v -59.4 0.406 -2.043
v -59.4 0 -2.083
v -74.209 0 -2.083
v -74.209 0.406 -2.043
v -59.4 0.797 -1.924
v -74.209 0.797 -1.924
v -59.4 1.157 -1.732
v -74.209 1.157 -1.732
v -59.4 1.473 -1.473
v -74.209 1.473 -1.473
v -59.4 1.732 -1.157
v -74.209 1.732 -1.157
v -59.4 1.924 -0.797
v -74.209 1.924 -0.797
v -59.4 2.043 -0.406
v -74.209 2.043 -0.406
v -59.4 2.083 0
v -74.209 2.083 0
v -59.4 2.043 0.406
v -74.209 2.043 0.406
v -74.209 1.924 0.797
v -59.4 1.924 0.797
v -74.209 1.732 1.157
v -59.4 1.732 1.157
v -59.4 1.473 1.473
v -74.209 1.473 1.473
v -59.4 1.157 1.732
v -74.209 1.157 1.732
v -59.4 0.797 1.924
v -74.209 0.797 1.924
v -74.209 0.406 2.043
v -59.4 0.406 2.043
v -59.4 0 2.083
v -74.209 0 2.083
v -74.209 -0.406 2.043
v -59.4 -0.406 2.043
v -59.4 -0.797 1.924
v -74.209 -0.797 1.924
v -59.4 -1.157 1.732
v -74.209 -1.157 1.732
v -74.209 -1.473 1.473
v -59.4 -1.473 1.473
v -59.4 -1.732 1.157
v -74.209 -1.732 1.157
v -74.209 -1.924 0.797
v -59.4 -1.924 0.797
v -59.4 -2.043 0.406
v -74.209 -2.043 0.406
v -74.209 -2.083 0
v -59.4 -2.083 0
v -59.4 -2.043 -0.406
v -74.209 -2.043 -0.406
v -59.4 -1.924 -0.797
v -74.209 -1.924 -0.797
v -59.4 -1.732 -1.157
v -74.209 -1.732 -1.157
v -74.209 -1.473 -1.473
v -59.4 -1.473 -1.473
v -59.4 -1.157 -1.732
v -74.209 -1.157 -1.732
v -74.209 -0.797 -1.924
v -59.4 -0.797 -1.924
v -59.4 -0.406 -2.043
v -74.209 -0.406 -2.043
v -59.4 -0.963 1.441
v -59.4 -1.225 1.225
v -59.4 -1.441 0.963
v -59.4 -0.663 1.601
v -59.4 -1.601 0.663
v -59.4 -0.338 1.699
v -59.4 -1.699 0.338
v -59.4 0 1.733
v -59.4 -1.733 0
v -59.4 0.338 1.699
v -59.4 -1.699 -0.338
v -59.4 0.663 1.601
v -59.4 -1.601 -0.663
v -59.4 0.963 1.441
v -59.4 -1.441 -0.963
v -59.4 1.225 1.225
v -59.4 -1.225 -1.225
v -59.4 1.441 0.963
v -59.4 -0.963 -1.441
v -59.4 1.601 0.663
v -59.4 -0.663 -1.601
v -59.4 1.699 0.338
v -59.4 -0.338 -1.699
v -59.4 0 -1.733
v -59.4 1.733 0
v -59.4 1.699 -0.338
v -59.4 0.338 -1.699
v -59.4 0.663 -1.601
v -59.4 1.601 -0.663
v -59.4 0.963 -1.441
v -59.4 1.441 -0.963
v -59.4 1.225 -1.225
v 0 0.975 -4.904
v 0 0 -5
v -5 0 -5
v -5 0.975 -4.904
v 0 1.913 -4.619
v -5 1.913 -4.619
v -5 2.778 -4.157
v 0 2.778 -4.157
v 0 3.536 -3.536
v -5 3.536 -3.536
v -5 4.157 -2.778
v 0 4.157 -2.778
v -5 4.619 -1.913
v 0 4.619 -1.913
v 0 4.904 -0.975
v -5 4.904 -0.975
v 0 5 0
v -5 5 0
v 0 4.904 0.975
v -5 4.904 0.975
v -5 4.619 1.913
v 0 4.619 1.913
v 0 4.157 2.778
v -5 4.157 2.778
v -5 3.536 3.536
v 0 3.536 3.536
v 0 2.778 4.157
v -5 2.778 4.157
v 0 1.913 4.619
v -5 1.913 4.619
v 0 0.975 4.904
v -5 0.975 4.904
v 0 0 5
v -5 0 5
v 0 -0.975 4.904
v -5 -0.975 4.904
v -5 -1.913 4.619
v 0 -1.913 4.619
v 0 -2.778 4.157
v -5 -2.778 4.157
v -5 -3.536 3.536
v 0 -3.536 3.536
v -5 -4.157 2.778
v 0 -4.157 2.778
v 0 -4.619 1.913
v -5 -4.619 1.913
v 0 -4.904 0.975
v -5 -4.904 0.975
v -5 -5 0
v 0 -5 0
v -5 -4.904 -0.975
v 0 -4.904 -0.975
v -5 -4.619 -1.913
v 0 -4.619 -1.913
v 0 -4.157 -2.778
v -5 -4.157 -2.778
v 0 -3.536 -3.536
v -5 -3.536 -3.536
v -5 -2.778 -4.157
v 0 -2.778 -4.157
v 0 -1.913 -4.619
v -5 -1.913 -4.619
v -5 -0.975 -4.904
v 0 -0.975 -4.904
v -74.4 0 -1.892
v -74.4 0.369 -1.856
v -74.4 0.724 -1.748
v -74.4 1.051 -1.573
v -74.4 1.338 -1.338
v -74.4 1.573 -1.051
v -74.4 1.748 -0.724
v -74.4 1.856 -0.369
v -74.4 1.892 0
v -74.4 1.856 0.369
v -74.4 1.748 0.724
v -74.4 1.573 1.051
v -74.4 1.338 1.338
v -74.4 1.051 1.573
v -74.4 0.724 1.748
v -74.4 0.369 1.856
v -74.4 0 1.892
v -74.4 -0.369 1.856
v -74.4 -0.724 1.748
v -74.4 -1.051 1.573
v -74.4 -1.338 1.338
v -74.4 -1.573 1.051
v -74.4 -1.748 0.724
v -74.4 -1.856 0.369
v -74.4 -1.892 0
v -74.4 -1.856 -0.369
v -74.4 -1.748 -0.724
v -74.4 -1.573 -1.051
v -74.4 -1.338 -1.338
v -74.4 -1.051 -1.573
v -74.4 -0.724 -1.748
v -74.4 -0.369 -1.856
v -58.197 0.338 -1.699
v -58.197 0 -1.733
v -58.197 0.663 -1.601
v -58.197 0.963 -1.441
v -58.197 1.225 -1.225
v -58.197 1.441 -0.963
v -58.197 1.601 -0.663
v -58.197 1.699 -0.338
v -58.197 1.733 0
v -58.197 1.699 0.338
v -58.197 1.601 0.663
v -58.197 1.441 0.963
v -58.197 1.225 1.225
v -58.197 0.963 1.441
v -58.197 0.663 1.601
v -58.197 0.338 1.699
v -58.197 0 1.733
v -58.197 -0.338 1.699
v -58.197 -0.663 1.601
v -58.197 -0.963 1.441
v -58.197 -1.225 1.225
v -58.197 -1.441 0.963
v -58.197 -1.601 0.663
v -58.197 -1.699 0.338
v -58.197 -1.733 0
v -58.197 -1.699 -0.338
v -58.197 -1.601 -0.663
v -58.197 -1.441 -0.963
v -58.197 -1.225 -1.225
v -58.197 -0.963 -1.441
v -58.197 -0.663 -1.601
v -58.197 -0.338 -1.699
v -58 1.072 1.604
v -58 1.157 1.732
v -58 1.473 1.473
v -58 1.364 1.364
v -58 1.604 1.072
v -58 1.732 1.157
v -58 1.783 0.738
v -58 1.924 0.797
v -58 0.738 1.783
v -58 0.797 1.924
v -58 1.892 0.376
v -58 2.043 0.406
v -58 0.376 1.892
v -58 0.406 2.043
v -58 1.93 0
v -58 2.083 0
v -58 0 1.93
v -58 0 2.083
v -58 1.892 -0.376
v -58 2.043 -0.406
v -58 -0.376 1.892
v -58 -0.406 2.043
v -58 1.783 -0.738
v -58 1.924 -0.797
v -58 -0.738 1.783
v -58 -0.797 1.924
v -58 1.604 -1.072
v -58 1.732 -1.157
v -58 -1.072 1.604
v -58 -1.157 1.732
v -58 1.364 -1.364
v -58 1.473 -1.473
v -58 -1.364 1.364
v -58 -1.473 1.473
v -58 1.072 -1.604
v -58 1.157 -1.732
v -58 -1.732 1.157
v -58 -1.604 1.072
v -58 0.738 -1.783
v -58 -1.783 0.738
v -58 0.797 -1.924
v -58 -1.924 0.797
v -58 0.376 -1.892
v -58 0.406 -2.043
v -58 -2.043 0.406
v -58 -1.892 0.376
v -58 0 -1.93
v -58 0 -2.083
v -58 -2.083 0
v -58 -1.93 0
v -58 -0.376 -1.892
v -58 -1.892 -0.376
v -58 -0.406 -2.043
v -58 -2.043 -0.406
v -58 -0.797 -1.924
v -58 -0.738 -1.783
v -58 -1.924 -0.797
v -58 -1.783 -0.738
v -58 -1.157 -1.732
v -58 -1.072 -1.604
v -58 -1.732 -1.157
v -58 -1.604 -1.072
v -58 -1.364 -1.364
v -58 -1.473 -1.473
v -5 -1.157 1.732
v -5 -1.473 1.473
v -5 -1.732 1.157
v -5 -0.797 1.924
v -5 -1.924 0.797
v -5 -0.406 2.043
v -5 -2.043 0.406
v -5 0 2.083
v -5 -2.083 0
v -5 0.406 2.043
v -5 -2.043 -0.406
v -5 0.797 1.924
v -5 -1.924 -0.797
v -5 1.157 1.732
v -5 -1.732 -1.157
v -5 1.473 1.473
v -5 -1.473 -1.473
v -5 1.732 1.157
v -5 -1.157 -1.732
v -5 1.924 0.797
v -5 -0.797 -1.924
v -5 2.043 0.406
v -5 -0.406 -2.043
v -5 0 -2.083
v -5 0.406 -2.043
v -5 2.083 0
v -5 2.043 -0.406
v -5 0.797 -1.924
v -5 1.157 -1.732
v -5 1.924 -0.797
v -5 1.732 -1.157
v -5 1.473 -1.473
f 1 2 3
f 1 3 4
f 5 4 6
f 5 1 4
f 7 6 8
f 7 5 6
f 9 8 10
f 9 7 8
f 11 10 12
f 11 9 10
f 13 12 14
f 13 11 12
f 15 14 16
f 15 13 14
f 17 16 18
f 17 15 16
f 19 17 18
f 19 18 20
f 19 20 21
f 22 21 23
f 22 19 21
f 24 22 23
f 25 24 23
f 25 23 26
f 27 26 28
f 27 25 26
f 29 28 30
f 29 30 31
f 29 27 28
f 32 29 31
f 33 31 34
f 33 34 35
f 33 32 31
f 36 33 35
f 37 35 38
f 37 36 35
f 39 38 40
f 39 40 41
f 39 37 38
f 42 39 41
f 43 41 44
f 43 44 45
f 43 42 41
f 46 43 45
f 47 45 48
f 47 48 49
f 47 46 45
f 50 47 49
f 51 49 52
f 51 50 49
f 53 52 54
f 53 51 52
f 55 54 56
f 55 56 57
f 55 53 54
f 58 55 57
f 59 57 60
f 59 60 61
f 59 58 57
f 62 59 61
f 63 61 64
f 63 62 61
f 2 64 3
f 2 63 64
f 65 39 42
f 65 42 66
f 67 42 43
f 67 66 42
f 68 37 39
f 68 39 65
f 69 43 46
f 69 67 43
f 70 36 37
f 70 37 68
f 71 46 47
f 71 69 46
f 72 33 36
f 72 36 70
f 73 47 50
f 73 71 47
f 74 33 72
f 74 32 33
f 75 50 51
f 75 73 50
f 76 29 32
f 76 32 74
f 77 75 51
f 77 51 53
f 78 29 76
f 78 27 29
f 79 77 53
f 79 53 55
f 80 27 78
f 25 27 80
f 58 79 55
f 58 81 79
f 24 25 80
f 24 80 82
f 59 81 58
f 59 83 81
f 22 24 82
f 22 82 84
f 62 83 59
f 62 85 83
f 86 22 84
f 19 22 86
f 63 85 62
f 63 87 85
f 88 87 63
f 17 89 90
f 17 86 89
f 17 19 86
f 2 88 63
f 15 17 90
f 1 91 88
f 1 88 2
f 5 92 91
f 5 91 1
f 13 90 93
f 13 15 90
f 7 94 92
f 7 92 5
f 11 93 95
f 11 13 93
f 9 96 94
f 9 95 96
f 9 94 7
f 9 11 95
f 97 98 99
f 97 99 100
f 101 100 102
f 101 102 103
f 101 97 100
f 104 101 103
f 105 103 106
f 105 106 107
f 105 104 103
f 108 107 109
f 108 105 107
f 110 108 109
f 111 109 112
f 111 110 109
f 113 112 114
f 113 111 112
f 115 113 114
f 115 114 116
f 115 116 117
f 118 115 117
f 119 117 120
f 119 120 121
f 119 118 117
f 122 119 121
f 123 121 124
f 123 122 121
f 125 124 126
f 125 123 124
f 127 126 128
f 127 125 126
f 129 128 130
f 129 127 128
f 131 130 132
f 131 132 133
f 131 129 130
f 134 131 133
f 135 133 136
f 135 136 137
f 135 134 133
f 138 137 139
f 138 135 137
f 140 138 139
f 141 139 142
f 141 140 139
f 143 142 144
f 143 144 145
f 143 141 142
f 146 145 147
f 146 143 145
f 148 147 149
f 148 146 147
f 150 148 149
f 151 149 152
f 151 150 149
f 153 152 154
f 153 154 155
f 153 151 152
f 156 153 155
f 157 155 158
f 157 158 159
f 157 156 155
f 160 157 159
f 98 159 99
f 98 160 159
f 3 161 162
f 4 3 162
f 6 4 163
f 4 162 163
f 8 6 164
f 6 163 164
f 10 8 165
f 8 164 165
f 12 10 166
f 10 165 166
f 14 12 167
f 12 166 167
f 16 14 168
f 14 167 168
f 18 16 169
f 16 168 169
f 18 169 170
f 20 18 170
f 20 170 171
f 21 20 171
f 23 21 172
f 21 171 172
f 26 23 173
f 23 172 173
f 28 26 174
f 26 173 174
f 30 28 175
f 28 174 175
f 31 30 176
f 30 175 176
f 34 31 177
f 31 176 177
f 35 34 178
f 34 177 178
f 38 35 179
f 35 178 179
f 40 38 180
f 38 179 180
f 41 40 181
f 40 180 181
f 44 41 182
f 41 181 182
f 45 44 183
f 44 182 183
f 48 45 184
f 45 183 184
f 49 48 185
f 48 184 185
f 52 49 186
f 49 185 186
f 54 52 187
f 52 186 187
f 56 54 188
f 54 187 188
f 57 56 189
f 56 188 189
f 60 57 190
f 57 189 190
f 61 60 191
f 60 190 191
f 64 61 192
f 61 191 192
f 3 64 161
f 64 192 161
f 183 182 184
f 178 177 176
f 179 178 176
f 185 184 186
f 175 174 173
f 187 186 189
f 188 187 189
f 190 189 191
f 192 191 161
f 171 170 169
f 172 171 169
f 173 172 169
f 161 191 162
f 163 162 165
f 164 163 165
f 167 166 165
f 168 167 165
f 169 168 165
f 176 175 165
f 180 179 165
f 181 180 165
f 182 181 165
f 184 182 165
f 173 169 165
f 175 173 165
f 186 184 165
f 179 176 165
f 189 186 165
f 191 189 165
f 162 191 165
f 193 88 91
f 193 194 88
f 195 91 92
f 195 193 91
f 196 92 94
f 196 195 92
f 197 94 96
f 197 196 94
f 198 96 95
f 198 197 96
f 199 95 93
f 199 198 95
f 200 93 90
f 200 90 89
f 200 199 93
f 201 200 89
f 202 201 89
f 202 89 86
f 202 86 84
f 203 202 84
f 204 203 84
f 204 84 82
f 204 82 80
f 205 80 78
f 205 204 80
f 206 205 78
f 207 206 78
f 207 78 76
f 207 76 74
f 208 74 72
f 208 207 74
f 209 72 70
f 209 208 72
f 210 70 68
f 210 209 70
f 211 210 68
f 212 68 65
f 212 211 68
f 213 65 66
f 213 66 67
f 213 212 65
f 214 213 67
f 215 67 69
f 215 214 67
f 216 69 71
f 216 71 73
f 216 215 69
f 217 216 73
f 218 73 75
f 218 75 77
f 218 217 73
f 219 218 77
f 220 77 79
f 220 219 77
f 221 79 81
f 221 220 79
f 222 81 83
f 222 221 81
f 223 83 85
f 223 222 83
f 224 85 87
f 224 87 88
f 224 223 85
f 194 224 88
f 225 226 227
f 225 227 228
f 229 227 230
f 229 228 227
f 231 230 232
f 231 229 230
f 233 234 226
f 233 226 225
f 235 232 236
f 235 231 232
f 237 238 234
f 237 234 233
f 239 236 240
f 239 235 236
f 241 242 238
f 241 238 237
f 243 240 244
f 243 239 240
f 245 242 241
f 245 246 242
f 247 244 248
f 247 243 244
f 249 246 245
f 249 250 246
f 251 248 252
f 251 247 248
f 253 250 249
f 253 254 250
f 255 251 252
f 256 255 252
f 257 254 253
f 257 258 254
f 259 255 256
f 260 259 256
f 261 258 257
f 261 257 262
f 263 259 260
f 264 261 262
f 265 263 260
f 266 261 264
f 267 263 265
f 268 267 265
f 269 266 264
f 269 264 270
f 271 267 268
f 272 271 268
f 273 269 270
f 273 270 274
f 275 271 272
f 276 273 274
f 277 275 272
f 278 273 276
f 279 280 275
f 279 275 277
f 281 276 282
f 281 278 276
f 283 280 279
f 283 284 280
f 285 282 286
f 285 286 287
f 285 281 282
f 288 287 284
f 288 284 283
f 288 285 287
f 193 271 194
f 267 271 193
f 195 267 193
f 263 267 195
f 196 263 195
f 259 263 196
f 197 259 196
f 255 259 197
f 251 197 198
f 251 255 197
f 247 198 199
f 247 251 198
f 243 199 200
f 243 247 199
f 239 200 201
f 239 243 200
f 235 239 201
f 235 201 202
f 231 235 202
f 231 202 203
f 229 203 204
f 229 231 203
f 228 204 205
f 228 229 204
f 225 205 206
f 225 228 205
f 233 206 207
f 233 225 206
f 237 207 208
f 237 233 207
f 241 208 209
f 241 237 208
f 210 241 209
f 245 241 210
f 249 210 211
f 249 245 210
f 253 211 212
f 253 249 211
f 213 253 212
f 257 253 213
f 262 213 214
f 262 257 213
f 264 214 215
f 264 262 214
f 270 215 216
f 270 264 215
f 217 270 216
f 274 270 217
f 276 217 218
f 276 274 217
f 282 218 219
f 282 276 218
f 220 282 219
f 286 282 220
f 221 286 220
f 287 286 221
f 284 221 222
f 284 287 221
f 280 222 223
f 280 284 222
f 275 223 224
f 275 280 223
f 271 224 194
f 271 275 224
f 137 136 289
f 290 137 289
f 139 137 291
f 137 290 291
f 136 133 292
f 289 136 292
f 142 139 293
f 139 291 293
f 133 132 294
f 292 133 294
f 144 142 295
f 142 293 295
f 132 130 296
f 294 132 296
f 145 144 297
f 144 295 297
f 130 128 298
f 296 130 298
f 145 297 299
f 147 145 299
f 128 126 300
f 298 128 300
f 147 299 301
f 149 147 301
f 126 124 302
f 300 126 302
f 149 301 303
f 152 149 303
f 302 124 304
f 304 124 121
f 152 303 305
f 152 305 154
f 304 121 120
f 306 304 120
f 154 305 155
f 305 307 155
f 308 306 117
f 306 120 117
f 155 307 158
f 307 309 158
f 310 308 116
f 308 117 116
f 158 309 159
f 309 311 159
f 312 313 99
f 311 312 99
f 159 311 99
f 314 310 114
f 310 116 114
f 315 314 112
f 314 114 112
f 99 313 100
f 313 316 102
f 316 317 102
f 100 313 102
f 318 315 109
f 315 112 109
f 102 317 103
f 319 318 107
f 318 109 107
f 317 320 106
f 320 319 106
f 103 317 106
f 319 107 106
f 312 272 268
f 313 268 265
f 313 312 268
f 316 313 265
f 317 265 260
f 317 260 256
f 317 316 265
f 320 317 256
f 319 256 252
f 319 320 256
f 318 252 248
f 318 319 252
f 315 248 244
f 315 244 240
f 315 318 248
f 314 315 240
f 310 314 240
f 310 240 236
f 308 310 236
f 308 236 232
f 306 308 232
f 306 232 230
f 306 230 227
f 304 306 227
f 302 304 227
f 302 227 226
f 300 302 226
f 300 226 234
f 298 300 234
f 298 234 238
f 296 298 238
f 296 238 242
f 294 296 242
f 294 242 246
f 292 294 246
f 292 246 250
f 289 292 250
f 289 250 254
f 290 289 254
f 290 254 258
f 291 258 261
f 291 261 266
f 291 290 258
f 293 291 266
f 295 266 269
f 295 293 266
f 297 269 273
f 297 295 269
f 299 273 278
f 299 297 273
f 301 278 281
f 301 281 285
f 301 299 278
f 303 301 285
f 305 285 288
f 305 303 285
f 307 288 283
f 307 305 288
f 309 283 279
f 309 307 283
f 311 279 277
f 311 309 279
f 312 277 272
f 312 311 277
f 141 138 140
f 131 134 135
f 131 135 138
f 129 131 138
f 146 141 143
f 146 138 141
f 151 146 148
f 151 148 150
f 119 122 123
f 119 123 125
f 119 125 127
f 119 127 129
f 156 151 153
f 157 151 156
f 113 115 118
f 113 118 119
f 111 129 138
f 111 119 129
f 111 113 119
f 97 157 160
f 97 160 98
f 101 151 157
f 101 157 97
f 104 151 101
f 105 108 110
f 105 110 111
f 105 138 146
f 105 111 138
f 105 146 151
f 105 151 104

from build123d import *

# Parameters (mm, degrees)
SKETCH1_R           = 4.99999
SKETCH1_R_2         = 2.182749
SKETCH1_R_3         = 2.0828
SKETCH1_R_4         = 1.932813
SKETCH1_R_5         = 1.732788
BOSS_EXTRUDE2_DEPTH = 4.99999
SKETCH1_5_R         = 2.0828
BOSS_EXTRUDE3_DEPTH = 57.999884
BOSS_EXTRUDE4_START = -57.999884
SKETCH1_6_R         = 1.932813
BOSS_EXTRUDE4_DEPTH = 0.199898
BOSS_EXTRUDE5_START = -58.199782
SKETCH1_7_R         = 1.732788
BOSS_EXTRUDE5_DEPTH = 1.199896
BOSS_EXTRUDE6_START = -59.399678
SKETCH1_8_R         = 2.0828
BOSS_EXTRUDE6_DEPTH = 14.99997
CHAMFER1_SIZE       = 0.2032
CHAMFER2_SIZE       = 0.1905


with BuildPart() as part:
    # Sketch1 → Boss-Extrude2 (new body)
    # profile 1 of 5: a face of its own
    with BuildSketch(Plane(origin=(0, 0, 0), x_dir=(0, 0, -1), z_dir=(1, 0, 0))):
        Circle(SKETCH1_R)
        Circle(SKETCH1_R_2, mode=Mode.SUBTRACT)
    # profile 2 of 5: a face of its own
    with BuildSketch(Plane(origin=(0, 0, 0), x_dir=(0, 0, -1), z_dir=(1, 0, 0))):
        Circle(SKETCH1_R_2)
        Circle(SKETCH1_R_3, mode=Mode.SUBTRACT)
    # profile 3 of 5: a face of its own
    with BuildSketch(Plane(origin=(0, 0, 0), x_dir=(0, 0, -1), z_dir=(1, 0, 0))):
        Circle(SKETCH1_R_3)
        Circle(SKETCH1_R_4, mode=Mode.SUBTRACT)
    # profile 4 of 5: a face of its own
    with BuildSketch(Plane(origin=(0, 0, 0), x_dir=(0, 0, -1), z_dir=(1, 0, 0))):
        Circle(SKETCH1_R_4)
        Circle(SKETCH1_R_5, mode=Mode.SUBTRACT)
    # profile 5 of 5: a face of its own
    with BuildSketch(Plane(origin=(0, 0, 0), x_dir=(0, 0, -1), z_dir=(1, 0, 0))):
        Circle(SKETCH1_R_5)
    extrude(amount=-BOSS_EXTRUDE2_DEPTH)

    # Sketch1<5> → Boss-Extrude3 (add)
    with BuildSketch(Plane(origin=(0, 0, 0), x_dir=(0, 0, -1), z_dir=(1, 0, 0))):
        Circle(SKETCH1_5_R)
    extrude(amount=-BOSS_EXTRUDE3_DEPTH)

    # Sketch1<6> → Boss-Extrude4 (add)
    with BuildSketch(Plane(origin=(0, 0, 0), x_dir=(0, 0, -1), z_dir=(1, 0, 0)).offset(BOSS_EXTRUDE4_START)):
        Circle(SKETCH1_6_R)
    extrude(amount=-BOSS_EXTRUDE4_DEPTH)

    # Sketch1<7> → Boss-Extrude5 (add)
    with BuildSketch(Plane(origin=(0, 0, 0), x_dir=(0, 0, -1), z_dir=(1, 0, 0)).offset(BOSS_EXTRUDE5_START)):
        Circle(SKETCH1_7_R)
    extrude(amount=-BOSS_EXTRUDE5_DEPTH)

    # Sketch1<8> → Boss-Extrude6 (add)
    with BuildSketch(Plane(origin=(0, 0, 0), x_dir=(0, 0, -1), z_dir=(1, 0, 0)).offset(BOSS_EXTRUDE6_START)):
        Circle(SKETCH1_8_R)
    extrude(amount=-BOSS_EXTRUDE6_DEPTH)

    # Chamfer1
    # the kernel refuses this chamfer: 0.2032 mm, written as the material it takes off along each edge
    with BuildSketch(Plane(origin=(-58.199782, 0, 0), x_dir=(0, 0, -1), z_dir=(0, -1, 0))) as chamfer1_piece_1_section:
        Polygon((1.932813 - CHAMFER1_SIZE, 0), (1.932813, CHAMFER1_SIZE), (1.932813, 0), align=None)
    chamfer1_piece_1 = revolve(axis=Axis((-58.199782, 0, 0), (1, 0, 0)), mode=Mode.PRIVATE)
    chamfer1_piece_1 = chamfer1_piece_1 - Plane(origin=(-58.102785298, 0, 0), x_dir=(0, 0, -1), z_dir=(1, 0, 0)) * Cylinder(1.732788, 8, mode=Mode.PRIVATE)
    chamfer1_piece_1 = split(chamfer1_piece_1, bisect_by=Plane(origin=(-57.999884, 0, 1.835689298), z_dir=(-1, 0, 0)), keep=Keep.TOP, mode=Mode.PRIVATE)
    add(chamfer1_piece_1, mode=Mode.SUBTRACT)

    # Chamfer2
    chamfer2_edges = [part.edges().sort_by_distance(p)[0] for p in [
        (-74.399648, 0, 2.0828),
    ]]
    chamfer(chamfer2_edges, length=CHAMFER2_SIZE)


solid = part.part
